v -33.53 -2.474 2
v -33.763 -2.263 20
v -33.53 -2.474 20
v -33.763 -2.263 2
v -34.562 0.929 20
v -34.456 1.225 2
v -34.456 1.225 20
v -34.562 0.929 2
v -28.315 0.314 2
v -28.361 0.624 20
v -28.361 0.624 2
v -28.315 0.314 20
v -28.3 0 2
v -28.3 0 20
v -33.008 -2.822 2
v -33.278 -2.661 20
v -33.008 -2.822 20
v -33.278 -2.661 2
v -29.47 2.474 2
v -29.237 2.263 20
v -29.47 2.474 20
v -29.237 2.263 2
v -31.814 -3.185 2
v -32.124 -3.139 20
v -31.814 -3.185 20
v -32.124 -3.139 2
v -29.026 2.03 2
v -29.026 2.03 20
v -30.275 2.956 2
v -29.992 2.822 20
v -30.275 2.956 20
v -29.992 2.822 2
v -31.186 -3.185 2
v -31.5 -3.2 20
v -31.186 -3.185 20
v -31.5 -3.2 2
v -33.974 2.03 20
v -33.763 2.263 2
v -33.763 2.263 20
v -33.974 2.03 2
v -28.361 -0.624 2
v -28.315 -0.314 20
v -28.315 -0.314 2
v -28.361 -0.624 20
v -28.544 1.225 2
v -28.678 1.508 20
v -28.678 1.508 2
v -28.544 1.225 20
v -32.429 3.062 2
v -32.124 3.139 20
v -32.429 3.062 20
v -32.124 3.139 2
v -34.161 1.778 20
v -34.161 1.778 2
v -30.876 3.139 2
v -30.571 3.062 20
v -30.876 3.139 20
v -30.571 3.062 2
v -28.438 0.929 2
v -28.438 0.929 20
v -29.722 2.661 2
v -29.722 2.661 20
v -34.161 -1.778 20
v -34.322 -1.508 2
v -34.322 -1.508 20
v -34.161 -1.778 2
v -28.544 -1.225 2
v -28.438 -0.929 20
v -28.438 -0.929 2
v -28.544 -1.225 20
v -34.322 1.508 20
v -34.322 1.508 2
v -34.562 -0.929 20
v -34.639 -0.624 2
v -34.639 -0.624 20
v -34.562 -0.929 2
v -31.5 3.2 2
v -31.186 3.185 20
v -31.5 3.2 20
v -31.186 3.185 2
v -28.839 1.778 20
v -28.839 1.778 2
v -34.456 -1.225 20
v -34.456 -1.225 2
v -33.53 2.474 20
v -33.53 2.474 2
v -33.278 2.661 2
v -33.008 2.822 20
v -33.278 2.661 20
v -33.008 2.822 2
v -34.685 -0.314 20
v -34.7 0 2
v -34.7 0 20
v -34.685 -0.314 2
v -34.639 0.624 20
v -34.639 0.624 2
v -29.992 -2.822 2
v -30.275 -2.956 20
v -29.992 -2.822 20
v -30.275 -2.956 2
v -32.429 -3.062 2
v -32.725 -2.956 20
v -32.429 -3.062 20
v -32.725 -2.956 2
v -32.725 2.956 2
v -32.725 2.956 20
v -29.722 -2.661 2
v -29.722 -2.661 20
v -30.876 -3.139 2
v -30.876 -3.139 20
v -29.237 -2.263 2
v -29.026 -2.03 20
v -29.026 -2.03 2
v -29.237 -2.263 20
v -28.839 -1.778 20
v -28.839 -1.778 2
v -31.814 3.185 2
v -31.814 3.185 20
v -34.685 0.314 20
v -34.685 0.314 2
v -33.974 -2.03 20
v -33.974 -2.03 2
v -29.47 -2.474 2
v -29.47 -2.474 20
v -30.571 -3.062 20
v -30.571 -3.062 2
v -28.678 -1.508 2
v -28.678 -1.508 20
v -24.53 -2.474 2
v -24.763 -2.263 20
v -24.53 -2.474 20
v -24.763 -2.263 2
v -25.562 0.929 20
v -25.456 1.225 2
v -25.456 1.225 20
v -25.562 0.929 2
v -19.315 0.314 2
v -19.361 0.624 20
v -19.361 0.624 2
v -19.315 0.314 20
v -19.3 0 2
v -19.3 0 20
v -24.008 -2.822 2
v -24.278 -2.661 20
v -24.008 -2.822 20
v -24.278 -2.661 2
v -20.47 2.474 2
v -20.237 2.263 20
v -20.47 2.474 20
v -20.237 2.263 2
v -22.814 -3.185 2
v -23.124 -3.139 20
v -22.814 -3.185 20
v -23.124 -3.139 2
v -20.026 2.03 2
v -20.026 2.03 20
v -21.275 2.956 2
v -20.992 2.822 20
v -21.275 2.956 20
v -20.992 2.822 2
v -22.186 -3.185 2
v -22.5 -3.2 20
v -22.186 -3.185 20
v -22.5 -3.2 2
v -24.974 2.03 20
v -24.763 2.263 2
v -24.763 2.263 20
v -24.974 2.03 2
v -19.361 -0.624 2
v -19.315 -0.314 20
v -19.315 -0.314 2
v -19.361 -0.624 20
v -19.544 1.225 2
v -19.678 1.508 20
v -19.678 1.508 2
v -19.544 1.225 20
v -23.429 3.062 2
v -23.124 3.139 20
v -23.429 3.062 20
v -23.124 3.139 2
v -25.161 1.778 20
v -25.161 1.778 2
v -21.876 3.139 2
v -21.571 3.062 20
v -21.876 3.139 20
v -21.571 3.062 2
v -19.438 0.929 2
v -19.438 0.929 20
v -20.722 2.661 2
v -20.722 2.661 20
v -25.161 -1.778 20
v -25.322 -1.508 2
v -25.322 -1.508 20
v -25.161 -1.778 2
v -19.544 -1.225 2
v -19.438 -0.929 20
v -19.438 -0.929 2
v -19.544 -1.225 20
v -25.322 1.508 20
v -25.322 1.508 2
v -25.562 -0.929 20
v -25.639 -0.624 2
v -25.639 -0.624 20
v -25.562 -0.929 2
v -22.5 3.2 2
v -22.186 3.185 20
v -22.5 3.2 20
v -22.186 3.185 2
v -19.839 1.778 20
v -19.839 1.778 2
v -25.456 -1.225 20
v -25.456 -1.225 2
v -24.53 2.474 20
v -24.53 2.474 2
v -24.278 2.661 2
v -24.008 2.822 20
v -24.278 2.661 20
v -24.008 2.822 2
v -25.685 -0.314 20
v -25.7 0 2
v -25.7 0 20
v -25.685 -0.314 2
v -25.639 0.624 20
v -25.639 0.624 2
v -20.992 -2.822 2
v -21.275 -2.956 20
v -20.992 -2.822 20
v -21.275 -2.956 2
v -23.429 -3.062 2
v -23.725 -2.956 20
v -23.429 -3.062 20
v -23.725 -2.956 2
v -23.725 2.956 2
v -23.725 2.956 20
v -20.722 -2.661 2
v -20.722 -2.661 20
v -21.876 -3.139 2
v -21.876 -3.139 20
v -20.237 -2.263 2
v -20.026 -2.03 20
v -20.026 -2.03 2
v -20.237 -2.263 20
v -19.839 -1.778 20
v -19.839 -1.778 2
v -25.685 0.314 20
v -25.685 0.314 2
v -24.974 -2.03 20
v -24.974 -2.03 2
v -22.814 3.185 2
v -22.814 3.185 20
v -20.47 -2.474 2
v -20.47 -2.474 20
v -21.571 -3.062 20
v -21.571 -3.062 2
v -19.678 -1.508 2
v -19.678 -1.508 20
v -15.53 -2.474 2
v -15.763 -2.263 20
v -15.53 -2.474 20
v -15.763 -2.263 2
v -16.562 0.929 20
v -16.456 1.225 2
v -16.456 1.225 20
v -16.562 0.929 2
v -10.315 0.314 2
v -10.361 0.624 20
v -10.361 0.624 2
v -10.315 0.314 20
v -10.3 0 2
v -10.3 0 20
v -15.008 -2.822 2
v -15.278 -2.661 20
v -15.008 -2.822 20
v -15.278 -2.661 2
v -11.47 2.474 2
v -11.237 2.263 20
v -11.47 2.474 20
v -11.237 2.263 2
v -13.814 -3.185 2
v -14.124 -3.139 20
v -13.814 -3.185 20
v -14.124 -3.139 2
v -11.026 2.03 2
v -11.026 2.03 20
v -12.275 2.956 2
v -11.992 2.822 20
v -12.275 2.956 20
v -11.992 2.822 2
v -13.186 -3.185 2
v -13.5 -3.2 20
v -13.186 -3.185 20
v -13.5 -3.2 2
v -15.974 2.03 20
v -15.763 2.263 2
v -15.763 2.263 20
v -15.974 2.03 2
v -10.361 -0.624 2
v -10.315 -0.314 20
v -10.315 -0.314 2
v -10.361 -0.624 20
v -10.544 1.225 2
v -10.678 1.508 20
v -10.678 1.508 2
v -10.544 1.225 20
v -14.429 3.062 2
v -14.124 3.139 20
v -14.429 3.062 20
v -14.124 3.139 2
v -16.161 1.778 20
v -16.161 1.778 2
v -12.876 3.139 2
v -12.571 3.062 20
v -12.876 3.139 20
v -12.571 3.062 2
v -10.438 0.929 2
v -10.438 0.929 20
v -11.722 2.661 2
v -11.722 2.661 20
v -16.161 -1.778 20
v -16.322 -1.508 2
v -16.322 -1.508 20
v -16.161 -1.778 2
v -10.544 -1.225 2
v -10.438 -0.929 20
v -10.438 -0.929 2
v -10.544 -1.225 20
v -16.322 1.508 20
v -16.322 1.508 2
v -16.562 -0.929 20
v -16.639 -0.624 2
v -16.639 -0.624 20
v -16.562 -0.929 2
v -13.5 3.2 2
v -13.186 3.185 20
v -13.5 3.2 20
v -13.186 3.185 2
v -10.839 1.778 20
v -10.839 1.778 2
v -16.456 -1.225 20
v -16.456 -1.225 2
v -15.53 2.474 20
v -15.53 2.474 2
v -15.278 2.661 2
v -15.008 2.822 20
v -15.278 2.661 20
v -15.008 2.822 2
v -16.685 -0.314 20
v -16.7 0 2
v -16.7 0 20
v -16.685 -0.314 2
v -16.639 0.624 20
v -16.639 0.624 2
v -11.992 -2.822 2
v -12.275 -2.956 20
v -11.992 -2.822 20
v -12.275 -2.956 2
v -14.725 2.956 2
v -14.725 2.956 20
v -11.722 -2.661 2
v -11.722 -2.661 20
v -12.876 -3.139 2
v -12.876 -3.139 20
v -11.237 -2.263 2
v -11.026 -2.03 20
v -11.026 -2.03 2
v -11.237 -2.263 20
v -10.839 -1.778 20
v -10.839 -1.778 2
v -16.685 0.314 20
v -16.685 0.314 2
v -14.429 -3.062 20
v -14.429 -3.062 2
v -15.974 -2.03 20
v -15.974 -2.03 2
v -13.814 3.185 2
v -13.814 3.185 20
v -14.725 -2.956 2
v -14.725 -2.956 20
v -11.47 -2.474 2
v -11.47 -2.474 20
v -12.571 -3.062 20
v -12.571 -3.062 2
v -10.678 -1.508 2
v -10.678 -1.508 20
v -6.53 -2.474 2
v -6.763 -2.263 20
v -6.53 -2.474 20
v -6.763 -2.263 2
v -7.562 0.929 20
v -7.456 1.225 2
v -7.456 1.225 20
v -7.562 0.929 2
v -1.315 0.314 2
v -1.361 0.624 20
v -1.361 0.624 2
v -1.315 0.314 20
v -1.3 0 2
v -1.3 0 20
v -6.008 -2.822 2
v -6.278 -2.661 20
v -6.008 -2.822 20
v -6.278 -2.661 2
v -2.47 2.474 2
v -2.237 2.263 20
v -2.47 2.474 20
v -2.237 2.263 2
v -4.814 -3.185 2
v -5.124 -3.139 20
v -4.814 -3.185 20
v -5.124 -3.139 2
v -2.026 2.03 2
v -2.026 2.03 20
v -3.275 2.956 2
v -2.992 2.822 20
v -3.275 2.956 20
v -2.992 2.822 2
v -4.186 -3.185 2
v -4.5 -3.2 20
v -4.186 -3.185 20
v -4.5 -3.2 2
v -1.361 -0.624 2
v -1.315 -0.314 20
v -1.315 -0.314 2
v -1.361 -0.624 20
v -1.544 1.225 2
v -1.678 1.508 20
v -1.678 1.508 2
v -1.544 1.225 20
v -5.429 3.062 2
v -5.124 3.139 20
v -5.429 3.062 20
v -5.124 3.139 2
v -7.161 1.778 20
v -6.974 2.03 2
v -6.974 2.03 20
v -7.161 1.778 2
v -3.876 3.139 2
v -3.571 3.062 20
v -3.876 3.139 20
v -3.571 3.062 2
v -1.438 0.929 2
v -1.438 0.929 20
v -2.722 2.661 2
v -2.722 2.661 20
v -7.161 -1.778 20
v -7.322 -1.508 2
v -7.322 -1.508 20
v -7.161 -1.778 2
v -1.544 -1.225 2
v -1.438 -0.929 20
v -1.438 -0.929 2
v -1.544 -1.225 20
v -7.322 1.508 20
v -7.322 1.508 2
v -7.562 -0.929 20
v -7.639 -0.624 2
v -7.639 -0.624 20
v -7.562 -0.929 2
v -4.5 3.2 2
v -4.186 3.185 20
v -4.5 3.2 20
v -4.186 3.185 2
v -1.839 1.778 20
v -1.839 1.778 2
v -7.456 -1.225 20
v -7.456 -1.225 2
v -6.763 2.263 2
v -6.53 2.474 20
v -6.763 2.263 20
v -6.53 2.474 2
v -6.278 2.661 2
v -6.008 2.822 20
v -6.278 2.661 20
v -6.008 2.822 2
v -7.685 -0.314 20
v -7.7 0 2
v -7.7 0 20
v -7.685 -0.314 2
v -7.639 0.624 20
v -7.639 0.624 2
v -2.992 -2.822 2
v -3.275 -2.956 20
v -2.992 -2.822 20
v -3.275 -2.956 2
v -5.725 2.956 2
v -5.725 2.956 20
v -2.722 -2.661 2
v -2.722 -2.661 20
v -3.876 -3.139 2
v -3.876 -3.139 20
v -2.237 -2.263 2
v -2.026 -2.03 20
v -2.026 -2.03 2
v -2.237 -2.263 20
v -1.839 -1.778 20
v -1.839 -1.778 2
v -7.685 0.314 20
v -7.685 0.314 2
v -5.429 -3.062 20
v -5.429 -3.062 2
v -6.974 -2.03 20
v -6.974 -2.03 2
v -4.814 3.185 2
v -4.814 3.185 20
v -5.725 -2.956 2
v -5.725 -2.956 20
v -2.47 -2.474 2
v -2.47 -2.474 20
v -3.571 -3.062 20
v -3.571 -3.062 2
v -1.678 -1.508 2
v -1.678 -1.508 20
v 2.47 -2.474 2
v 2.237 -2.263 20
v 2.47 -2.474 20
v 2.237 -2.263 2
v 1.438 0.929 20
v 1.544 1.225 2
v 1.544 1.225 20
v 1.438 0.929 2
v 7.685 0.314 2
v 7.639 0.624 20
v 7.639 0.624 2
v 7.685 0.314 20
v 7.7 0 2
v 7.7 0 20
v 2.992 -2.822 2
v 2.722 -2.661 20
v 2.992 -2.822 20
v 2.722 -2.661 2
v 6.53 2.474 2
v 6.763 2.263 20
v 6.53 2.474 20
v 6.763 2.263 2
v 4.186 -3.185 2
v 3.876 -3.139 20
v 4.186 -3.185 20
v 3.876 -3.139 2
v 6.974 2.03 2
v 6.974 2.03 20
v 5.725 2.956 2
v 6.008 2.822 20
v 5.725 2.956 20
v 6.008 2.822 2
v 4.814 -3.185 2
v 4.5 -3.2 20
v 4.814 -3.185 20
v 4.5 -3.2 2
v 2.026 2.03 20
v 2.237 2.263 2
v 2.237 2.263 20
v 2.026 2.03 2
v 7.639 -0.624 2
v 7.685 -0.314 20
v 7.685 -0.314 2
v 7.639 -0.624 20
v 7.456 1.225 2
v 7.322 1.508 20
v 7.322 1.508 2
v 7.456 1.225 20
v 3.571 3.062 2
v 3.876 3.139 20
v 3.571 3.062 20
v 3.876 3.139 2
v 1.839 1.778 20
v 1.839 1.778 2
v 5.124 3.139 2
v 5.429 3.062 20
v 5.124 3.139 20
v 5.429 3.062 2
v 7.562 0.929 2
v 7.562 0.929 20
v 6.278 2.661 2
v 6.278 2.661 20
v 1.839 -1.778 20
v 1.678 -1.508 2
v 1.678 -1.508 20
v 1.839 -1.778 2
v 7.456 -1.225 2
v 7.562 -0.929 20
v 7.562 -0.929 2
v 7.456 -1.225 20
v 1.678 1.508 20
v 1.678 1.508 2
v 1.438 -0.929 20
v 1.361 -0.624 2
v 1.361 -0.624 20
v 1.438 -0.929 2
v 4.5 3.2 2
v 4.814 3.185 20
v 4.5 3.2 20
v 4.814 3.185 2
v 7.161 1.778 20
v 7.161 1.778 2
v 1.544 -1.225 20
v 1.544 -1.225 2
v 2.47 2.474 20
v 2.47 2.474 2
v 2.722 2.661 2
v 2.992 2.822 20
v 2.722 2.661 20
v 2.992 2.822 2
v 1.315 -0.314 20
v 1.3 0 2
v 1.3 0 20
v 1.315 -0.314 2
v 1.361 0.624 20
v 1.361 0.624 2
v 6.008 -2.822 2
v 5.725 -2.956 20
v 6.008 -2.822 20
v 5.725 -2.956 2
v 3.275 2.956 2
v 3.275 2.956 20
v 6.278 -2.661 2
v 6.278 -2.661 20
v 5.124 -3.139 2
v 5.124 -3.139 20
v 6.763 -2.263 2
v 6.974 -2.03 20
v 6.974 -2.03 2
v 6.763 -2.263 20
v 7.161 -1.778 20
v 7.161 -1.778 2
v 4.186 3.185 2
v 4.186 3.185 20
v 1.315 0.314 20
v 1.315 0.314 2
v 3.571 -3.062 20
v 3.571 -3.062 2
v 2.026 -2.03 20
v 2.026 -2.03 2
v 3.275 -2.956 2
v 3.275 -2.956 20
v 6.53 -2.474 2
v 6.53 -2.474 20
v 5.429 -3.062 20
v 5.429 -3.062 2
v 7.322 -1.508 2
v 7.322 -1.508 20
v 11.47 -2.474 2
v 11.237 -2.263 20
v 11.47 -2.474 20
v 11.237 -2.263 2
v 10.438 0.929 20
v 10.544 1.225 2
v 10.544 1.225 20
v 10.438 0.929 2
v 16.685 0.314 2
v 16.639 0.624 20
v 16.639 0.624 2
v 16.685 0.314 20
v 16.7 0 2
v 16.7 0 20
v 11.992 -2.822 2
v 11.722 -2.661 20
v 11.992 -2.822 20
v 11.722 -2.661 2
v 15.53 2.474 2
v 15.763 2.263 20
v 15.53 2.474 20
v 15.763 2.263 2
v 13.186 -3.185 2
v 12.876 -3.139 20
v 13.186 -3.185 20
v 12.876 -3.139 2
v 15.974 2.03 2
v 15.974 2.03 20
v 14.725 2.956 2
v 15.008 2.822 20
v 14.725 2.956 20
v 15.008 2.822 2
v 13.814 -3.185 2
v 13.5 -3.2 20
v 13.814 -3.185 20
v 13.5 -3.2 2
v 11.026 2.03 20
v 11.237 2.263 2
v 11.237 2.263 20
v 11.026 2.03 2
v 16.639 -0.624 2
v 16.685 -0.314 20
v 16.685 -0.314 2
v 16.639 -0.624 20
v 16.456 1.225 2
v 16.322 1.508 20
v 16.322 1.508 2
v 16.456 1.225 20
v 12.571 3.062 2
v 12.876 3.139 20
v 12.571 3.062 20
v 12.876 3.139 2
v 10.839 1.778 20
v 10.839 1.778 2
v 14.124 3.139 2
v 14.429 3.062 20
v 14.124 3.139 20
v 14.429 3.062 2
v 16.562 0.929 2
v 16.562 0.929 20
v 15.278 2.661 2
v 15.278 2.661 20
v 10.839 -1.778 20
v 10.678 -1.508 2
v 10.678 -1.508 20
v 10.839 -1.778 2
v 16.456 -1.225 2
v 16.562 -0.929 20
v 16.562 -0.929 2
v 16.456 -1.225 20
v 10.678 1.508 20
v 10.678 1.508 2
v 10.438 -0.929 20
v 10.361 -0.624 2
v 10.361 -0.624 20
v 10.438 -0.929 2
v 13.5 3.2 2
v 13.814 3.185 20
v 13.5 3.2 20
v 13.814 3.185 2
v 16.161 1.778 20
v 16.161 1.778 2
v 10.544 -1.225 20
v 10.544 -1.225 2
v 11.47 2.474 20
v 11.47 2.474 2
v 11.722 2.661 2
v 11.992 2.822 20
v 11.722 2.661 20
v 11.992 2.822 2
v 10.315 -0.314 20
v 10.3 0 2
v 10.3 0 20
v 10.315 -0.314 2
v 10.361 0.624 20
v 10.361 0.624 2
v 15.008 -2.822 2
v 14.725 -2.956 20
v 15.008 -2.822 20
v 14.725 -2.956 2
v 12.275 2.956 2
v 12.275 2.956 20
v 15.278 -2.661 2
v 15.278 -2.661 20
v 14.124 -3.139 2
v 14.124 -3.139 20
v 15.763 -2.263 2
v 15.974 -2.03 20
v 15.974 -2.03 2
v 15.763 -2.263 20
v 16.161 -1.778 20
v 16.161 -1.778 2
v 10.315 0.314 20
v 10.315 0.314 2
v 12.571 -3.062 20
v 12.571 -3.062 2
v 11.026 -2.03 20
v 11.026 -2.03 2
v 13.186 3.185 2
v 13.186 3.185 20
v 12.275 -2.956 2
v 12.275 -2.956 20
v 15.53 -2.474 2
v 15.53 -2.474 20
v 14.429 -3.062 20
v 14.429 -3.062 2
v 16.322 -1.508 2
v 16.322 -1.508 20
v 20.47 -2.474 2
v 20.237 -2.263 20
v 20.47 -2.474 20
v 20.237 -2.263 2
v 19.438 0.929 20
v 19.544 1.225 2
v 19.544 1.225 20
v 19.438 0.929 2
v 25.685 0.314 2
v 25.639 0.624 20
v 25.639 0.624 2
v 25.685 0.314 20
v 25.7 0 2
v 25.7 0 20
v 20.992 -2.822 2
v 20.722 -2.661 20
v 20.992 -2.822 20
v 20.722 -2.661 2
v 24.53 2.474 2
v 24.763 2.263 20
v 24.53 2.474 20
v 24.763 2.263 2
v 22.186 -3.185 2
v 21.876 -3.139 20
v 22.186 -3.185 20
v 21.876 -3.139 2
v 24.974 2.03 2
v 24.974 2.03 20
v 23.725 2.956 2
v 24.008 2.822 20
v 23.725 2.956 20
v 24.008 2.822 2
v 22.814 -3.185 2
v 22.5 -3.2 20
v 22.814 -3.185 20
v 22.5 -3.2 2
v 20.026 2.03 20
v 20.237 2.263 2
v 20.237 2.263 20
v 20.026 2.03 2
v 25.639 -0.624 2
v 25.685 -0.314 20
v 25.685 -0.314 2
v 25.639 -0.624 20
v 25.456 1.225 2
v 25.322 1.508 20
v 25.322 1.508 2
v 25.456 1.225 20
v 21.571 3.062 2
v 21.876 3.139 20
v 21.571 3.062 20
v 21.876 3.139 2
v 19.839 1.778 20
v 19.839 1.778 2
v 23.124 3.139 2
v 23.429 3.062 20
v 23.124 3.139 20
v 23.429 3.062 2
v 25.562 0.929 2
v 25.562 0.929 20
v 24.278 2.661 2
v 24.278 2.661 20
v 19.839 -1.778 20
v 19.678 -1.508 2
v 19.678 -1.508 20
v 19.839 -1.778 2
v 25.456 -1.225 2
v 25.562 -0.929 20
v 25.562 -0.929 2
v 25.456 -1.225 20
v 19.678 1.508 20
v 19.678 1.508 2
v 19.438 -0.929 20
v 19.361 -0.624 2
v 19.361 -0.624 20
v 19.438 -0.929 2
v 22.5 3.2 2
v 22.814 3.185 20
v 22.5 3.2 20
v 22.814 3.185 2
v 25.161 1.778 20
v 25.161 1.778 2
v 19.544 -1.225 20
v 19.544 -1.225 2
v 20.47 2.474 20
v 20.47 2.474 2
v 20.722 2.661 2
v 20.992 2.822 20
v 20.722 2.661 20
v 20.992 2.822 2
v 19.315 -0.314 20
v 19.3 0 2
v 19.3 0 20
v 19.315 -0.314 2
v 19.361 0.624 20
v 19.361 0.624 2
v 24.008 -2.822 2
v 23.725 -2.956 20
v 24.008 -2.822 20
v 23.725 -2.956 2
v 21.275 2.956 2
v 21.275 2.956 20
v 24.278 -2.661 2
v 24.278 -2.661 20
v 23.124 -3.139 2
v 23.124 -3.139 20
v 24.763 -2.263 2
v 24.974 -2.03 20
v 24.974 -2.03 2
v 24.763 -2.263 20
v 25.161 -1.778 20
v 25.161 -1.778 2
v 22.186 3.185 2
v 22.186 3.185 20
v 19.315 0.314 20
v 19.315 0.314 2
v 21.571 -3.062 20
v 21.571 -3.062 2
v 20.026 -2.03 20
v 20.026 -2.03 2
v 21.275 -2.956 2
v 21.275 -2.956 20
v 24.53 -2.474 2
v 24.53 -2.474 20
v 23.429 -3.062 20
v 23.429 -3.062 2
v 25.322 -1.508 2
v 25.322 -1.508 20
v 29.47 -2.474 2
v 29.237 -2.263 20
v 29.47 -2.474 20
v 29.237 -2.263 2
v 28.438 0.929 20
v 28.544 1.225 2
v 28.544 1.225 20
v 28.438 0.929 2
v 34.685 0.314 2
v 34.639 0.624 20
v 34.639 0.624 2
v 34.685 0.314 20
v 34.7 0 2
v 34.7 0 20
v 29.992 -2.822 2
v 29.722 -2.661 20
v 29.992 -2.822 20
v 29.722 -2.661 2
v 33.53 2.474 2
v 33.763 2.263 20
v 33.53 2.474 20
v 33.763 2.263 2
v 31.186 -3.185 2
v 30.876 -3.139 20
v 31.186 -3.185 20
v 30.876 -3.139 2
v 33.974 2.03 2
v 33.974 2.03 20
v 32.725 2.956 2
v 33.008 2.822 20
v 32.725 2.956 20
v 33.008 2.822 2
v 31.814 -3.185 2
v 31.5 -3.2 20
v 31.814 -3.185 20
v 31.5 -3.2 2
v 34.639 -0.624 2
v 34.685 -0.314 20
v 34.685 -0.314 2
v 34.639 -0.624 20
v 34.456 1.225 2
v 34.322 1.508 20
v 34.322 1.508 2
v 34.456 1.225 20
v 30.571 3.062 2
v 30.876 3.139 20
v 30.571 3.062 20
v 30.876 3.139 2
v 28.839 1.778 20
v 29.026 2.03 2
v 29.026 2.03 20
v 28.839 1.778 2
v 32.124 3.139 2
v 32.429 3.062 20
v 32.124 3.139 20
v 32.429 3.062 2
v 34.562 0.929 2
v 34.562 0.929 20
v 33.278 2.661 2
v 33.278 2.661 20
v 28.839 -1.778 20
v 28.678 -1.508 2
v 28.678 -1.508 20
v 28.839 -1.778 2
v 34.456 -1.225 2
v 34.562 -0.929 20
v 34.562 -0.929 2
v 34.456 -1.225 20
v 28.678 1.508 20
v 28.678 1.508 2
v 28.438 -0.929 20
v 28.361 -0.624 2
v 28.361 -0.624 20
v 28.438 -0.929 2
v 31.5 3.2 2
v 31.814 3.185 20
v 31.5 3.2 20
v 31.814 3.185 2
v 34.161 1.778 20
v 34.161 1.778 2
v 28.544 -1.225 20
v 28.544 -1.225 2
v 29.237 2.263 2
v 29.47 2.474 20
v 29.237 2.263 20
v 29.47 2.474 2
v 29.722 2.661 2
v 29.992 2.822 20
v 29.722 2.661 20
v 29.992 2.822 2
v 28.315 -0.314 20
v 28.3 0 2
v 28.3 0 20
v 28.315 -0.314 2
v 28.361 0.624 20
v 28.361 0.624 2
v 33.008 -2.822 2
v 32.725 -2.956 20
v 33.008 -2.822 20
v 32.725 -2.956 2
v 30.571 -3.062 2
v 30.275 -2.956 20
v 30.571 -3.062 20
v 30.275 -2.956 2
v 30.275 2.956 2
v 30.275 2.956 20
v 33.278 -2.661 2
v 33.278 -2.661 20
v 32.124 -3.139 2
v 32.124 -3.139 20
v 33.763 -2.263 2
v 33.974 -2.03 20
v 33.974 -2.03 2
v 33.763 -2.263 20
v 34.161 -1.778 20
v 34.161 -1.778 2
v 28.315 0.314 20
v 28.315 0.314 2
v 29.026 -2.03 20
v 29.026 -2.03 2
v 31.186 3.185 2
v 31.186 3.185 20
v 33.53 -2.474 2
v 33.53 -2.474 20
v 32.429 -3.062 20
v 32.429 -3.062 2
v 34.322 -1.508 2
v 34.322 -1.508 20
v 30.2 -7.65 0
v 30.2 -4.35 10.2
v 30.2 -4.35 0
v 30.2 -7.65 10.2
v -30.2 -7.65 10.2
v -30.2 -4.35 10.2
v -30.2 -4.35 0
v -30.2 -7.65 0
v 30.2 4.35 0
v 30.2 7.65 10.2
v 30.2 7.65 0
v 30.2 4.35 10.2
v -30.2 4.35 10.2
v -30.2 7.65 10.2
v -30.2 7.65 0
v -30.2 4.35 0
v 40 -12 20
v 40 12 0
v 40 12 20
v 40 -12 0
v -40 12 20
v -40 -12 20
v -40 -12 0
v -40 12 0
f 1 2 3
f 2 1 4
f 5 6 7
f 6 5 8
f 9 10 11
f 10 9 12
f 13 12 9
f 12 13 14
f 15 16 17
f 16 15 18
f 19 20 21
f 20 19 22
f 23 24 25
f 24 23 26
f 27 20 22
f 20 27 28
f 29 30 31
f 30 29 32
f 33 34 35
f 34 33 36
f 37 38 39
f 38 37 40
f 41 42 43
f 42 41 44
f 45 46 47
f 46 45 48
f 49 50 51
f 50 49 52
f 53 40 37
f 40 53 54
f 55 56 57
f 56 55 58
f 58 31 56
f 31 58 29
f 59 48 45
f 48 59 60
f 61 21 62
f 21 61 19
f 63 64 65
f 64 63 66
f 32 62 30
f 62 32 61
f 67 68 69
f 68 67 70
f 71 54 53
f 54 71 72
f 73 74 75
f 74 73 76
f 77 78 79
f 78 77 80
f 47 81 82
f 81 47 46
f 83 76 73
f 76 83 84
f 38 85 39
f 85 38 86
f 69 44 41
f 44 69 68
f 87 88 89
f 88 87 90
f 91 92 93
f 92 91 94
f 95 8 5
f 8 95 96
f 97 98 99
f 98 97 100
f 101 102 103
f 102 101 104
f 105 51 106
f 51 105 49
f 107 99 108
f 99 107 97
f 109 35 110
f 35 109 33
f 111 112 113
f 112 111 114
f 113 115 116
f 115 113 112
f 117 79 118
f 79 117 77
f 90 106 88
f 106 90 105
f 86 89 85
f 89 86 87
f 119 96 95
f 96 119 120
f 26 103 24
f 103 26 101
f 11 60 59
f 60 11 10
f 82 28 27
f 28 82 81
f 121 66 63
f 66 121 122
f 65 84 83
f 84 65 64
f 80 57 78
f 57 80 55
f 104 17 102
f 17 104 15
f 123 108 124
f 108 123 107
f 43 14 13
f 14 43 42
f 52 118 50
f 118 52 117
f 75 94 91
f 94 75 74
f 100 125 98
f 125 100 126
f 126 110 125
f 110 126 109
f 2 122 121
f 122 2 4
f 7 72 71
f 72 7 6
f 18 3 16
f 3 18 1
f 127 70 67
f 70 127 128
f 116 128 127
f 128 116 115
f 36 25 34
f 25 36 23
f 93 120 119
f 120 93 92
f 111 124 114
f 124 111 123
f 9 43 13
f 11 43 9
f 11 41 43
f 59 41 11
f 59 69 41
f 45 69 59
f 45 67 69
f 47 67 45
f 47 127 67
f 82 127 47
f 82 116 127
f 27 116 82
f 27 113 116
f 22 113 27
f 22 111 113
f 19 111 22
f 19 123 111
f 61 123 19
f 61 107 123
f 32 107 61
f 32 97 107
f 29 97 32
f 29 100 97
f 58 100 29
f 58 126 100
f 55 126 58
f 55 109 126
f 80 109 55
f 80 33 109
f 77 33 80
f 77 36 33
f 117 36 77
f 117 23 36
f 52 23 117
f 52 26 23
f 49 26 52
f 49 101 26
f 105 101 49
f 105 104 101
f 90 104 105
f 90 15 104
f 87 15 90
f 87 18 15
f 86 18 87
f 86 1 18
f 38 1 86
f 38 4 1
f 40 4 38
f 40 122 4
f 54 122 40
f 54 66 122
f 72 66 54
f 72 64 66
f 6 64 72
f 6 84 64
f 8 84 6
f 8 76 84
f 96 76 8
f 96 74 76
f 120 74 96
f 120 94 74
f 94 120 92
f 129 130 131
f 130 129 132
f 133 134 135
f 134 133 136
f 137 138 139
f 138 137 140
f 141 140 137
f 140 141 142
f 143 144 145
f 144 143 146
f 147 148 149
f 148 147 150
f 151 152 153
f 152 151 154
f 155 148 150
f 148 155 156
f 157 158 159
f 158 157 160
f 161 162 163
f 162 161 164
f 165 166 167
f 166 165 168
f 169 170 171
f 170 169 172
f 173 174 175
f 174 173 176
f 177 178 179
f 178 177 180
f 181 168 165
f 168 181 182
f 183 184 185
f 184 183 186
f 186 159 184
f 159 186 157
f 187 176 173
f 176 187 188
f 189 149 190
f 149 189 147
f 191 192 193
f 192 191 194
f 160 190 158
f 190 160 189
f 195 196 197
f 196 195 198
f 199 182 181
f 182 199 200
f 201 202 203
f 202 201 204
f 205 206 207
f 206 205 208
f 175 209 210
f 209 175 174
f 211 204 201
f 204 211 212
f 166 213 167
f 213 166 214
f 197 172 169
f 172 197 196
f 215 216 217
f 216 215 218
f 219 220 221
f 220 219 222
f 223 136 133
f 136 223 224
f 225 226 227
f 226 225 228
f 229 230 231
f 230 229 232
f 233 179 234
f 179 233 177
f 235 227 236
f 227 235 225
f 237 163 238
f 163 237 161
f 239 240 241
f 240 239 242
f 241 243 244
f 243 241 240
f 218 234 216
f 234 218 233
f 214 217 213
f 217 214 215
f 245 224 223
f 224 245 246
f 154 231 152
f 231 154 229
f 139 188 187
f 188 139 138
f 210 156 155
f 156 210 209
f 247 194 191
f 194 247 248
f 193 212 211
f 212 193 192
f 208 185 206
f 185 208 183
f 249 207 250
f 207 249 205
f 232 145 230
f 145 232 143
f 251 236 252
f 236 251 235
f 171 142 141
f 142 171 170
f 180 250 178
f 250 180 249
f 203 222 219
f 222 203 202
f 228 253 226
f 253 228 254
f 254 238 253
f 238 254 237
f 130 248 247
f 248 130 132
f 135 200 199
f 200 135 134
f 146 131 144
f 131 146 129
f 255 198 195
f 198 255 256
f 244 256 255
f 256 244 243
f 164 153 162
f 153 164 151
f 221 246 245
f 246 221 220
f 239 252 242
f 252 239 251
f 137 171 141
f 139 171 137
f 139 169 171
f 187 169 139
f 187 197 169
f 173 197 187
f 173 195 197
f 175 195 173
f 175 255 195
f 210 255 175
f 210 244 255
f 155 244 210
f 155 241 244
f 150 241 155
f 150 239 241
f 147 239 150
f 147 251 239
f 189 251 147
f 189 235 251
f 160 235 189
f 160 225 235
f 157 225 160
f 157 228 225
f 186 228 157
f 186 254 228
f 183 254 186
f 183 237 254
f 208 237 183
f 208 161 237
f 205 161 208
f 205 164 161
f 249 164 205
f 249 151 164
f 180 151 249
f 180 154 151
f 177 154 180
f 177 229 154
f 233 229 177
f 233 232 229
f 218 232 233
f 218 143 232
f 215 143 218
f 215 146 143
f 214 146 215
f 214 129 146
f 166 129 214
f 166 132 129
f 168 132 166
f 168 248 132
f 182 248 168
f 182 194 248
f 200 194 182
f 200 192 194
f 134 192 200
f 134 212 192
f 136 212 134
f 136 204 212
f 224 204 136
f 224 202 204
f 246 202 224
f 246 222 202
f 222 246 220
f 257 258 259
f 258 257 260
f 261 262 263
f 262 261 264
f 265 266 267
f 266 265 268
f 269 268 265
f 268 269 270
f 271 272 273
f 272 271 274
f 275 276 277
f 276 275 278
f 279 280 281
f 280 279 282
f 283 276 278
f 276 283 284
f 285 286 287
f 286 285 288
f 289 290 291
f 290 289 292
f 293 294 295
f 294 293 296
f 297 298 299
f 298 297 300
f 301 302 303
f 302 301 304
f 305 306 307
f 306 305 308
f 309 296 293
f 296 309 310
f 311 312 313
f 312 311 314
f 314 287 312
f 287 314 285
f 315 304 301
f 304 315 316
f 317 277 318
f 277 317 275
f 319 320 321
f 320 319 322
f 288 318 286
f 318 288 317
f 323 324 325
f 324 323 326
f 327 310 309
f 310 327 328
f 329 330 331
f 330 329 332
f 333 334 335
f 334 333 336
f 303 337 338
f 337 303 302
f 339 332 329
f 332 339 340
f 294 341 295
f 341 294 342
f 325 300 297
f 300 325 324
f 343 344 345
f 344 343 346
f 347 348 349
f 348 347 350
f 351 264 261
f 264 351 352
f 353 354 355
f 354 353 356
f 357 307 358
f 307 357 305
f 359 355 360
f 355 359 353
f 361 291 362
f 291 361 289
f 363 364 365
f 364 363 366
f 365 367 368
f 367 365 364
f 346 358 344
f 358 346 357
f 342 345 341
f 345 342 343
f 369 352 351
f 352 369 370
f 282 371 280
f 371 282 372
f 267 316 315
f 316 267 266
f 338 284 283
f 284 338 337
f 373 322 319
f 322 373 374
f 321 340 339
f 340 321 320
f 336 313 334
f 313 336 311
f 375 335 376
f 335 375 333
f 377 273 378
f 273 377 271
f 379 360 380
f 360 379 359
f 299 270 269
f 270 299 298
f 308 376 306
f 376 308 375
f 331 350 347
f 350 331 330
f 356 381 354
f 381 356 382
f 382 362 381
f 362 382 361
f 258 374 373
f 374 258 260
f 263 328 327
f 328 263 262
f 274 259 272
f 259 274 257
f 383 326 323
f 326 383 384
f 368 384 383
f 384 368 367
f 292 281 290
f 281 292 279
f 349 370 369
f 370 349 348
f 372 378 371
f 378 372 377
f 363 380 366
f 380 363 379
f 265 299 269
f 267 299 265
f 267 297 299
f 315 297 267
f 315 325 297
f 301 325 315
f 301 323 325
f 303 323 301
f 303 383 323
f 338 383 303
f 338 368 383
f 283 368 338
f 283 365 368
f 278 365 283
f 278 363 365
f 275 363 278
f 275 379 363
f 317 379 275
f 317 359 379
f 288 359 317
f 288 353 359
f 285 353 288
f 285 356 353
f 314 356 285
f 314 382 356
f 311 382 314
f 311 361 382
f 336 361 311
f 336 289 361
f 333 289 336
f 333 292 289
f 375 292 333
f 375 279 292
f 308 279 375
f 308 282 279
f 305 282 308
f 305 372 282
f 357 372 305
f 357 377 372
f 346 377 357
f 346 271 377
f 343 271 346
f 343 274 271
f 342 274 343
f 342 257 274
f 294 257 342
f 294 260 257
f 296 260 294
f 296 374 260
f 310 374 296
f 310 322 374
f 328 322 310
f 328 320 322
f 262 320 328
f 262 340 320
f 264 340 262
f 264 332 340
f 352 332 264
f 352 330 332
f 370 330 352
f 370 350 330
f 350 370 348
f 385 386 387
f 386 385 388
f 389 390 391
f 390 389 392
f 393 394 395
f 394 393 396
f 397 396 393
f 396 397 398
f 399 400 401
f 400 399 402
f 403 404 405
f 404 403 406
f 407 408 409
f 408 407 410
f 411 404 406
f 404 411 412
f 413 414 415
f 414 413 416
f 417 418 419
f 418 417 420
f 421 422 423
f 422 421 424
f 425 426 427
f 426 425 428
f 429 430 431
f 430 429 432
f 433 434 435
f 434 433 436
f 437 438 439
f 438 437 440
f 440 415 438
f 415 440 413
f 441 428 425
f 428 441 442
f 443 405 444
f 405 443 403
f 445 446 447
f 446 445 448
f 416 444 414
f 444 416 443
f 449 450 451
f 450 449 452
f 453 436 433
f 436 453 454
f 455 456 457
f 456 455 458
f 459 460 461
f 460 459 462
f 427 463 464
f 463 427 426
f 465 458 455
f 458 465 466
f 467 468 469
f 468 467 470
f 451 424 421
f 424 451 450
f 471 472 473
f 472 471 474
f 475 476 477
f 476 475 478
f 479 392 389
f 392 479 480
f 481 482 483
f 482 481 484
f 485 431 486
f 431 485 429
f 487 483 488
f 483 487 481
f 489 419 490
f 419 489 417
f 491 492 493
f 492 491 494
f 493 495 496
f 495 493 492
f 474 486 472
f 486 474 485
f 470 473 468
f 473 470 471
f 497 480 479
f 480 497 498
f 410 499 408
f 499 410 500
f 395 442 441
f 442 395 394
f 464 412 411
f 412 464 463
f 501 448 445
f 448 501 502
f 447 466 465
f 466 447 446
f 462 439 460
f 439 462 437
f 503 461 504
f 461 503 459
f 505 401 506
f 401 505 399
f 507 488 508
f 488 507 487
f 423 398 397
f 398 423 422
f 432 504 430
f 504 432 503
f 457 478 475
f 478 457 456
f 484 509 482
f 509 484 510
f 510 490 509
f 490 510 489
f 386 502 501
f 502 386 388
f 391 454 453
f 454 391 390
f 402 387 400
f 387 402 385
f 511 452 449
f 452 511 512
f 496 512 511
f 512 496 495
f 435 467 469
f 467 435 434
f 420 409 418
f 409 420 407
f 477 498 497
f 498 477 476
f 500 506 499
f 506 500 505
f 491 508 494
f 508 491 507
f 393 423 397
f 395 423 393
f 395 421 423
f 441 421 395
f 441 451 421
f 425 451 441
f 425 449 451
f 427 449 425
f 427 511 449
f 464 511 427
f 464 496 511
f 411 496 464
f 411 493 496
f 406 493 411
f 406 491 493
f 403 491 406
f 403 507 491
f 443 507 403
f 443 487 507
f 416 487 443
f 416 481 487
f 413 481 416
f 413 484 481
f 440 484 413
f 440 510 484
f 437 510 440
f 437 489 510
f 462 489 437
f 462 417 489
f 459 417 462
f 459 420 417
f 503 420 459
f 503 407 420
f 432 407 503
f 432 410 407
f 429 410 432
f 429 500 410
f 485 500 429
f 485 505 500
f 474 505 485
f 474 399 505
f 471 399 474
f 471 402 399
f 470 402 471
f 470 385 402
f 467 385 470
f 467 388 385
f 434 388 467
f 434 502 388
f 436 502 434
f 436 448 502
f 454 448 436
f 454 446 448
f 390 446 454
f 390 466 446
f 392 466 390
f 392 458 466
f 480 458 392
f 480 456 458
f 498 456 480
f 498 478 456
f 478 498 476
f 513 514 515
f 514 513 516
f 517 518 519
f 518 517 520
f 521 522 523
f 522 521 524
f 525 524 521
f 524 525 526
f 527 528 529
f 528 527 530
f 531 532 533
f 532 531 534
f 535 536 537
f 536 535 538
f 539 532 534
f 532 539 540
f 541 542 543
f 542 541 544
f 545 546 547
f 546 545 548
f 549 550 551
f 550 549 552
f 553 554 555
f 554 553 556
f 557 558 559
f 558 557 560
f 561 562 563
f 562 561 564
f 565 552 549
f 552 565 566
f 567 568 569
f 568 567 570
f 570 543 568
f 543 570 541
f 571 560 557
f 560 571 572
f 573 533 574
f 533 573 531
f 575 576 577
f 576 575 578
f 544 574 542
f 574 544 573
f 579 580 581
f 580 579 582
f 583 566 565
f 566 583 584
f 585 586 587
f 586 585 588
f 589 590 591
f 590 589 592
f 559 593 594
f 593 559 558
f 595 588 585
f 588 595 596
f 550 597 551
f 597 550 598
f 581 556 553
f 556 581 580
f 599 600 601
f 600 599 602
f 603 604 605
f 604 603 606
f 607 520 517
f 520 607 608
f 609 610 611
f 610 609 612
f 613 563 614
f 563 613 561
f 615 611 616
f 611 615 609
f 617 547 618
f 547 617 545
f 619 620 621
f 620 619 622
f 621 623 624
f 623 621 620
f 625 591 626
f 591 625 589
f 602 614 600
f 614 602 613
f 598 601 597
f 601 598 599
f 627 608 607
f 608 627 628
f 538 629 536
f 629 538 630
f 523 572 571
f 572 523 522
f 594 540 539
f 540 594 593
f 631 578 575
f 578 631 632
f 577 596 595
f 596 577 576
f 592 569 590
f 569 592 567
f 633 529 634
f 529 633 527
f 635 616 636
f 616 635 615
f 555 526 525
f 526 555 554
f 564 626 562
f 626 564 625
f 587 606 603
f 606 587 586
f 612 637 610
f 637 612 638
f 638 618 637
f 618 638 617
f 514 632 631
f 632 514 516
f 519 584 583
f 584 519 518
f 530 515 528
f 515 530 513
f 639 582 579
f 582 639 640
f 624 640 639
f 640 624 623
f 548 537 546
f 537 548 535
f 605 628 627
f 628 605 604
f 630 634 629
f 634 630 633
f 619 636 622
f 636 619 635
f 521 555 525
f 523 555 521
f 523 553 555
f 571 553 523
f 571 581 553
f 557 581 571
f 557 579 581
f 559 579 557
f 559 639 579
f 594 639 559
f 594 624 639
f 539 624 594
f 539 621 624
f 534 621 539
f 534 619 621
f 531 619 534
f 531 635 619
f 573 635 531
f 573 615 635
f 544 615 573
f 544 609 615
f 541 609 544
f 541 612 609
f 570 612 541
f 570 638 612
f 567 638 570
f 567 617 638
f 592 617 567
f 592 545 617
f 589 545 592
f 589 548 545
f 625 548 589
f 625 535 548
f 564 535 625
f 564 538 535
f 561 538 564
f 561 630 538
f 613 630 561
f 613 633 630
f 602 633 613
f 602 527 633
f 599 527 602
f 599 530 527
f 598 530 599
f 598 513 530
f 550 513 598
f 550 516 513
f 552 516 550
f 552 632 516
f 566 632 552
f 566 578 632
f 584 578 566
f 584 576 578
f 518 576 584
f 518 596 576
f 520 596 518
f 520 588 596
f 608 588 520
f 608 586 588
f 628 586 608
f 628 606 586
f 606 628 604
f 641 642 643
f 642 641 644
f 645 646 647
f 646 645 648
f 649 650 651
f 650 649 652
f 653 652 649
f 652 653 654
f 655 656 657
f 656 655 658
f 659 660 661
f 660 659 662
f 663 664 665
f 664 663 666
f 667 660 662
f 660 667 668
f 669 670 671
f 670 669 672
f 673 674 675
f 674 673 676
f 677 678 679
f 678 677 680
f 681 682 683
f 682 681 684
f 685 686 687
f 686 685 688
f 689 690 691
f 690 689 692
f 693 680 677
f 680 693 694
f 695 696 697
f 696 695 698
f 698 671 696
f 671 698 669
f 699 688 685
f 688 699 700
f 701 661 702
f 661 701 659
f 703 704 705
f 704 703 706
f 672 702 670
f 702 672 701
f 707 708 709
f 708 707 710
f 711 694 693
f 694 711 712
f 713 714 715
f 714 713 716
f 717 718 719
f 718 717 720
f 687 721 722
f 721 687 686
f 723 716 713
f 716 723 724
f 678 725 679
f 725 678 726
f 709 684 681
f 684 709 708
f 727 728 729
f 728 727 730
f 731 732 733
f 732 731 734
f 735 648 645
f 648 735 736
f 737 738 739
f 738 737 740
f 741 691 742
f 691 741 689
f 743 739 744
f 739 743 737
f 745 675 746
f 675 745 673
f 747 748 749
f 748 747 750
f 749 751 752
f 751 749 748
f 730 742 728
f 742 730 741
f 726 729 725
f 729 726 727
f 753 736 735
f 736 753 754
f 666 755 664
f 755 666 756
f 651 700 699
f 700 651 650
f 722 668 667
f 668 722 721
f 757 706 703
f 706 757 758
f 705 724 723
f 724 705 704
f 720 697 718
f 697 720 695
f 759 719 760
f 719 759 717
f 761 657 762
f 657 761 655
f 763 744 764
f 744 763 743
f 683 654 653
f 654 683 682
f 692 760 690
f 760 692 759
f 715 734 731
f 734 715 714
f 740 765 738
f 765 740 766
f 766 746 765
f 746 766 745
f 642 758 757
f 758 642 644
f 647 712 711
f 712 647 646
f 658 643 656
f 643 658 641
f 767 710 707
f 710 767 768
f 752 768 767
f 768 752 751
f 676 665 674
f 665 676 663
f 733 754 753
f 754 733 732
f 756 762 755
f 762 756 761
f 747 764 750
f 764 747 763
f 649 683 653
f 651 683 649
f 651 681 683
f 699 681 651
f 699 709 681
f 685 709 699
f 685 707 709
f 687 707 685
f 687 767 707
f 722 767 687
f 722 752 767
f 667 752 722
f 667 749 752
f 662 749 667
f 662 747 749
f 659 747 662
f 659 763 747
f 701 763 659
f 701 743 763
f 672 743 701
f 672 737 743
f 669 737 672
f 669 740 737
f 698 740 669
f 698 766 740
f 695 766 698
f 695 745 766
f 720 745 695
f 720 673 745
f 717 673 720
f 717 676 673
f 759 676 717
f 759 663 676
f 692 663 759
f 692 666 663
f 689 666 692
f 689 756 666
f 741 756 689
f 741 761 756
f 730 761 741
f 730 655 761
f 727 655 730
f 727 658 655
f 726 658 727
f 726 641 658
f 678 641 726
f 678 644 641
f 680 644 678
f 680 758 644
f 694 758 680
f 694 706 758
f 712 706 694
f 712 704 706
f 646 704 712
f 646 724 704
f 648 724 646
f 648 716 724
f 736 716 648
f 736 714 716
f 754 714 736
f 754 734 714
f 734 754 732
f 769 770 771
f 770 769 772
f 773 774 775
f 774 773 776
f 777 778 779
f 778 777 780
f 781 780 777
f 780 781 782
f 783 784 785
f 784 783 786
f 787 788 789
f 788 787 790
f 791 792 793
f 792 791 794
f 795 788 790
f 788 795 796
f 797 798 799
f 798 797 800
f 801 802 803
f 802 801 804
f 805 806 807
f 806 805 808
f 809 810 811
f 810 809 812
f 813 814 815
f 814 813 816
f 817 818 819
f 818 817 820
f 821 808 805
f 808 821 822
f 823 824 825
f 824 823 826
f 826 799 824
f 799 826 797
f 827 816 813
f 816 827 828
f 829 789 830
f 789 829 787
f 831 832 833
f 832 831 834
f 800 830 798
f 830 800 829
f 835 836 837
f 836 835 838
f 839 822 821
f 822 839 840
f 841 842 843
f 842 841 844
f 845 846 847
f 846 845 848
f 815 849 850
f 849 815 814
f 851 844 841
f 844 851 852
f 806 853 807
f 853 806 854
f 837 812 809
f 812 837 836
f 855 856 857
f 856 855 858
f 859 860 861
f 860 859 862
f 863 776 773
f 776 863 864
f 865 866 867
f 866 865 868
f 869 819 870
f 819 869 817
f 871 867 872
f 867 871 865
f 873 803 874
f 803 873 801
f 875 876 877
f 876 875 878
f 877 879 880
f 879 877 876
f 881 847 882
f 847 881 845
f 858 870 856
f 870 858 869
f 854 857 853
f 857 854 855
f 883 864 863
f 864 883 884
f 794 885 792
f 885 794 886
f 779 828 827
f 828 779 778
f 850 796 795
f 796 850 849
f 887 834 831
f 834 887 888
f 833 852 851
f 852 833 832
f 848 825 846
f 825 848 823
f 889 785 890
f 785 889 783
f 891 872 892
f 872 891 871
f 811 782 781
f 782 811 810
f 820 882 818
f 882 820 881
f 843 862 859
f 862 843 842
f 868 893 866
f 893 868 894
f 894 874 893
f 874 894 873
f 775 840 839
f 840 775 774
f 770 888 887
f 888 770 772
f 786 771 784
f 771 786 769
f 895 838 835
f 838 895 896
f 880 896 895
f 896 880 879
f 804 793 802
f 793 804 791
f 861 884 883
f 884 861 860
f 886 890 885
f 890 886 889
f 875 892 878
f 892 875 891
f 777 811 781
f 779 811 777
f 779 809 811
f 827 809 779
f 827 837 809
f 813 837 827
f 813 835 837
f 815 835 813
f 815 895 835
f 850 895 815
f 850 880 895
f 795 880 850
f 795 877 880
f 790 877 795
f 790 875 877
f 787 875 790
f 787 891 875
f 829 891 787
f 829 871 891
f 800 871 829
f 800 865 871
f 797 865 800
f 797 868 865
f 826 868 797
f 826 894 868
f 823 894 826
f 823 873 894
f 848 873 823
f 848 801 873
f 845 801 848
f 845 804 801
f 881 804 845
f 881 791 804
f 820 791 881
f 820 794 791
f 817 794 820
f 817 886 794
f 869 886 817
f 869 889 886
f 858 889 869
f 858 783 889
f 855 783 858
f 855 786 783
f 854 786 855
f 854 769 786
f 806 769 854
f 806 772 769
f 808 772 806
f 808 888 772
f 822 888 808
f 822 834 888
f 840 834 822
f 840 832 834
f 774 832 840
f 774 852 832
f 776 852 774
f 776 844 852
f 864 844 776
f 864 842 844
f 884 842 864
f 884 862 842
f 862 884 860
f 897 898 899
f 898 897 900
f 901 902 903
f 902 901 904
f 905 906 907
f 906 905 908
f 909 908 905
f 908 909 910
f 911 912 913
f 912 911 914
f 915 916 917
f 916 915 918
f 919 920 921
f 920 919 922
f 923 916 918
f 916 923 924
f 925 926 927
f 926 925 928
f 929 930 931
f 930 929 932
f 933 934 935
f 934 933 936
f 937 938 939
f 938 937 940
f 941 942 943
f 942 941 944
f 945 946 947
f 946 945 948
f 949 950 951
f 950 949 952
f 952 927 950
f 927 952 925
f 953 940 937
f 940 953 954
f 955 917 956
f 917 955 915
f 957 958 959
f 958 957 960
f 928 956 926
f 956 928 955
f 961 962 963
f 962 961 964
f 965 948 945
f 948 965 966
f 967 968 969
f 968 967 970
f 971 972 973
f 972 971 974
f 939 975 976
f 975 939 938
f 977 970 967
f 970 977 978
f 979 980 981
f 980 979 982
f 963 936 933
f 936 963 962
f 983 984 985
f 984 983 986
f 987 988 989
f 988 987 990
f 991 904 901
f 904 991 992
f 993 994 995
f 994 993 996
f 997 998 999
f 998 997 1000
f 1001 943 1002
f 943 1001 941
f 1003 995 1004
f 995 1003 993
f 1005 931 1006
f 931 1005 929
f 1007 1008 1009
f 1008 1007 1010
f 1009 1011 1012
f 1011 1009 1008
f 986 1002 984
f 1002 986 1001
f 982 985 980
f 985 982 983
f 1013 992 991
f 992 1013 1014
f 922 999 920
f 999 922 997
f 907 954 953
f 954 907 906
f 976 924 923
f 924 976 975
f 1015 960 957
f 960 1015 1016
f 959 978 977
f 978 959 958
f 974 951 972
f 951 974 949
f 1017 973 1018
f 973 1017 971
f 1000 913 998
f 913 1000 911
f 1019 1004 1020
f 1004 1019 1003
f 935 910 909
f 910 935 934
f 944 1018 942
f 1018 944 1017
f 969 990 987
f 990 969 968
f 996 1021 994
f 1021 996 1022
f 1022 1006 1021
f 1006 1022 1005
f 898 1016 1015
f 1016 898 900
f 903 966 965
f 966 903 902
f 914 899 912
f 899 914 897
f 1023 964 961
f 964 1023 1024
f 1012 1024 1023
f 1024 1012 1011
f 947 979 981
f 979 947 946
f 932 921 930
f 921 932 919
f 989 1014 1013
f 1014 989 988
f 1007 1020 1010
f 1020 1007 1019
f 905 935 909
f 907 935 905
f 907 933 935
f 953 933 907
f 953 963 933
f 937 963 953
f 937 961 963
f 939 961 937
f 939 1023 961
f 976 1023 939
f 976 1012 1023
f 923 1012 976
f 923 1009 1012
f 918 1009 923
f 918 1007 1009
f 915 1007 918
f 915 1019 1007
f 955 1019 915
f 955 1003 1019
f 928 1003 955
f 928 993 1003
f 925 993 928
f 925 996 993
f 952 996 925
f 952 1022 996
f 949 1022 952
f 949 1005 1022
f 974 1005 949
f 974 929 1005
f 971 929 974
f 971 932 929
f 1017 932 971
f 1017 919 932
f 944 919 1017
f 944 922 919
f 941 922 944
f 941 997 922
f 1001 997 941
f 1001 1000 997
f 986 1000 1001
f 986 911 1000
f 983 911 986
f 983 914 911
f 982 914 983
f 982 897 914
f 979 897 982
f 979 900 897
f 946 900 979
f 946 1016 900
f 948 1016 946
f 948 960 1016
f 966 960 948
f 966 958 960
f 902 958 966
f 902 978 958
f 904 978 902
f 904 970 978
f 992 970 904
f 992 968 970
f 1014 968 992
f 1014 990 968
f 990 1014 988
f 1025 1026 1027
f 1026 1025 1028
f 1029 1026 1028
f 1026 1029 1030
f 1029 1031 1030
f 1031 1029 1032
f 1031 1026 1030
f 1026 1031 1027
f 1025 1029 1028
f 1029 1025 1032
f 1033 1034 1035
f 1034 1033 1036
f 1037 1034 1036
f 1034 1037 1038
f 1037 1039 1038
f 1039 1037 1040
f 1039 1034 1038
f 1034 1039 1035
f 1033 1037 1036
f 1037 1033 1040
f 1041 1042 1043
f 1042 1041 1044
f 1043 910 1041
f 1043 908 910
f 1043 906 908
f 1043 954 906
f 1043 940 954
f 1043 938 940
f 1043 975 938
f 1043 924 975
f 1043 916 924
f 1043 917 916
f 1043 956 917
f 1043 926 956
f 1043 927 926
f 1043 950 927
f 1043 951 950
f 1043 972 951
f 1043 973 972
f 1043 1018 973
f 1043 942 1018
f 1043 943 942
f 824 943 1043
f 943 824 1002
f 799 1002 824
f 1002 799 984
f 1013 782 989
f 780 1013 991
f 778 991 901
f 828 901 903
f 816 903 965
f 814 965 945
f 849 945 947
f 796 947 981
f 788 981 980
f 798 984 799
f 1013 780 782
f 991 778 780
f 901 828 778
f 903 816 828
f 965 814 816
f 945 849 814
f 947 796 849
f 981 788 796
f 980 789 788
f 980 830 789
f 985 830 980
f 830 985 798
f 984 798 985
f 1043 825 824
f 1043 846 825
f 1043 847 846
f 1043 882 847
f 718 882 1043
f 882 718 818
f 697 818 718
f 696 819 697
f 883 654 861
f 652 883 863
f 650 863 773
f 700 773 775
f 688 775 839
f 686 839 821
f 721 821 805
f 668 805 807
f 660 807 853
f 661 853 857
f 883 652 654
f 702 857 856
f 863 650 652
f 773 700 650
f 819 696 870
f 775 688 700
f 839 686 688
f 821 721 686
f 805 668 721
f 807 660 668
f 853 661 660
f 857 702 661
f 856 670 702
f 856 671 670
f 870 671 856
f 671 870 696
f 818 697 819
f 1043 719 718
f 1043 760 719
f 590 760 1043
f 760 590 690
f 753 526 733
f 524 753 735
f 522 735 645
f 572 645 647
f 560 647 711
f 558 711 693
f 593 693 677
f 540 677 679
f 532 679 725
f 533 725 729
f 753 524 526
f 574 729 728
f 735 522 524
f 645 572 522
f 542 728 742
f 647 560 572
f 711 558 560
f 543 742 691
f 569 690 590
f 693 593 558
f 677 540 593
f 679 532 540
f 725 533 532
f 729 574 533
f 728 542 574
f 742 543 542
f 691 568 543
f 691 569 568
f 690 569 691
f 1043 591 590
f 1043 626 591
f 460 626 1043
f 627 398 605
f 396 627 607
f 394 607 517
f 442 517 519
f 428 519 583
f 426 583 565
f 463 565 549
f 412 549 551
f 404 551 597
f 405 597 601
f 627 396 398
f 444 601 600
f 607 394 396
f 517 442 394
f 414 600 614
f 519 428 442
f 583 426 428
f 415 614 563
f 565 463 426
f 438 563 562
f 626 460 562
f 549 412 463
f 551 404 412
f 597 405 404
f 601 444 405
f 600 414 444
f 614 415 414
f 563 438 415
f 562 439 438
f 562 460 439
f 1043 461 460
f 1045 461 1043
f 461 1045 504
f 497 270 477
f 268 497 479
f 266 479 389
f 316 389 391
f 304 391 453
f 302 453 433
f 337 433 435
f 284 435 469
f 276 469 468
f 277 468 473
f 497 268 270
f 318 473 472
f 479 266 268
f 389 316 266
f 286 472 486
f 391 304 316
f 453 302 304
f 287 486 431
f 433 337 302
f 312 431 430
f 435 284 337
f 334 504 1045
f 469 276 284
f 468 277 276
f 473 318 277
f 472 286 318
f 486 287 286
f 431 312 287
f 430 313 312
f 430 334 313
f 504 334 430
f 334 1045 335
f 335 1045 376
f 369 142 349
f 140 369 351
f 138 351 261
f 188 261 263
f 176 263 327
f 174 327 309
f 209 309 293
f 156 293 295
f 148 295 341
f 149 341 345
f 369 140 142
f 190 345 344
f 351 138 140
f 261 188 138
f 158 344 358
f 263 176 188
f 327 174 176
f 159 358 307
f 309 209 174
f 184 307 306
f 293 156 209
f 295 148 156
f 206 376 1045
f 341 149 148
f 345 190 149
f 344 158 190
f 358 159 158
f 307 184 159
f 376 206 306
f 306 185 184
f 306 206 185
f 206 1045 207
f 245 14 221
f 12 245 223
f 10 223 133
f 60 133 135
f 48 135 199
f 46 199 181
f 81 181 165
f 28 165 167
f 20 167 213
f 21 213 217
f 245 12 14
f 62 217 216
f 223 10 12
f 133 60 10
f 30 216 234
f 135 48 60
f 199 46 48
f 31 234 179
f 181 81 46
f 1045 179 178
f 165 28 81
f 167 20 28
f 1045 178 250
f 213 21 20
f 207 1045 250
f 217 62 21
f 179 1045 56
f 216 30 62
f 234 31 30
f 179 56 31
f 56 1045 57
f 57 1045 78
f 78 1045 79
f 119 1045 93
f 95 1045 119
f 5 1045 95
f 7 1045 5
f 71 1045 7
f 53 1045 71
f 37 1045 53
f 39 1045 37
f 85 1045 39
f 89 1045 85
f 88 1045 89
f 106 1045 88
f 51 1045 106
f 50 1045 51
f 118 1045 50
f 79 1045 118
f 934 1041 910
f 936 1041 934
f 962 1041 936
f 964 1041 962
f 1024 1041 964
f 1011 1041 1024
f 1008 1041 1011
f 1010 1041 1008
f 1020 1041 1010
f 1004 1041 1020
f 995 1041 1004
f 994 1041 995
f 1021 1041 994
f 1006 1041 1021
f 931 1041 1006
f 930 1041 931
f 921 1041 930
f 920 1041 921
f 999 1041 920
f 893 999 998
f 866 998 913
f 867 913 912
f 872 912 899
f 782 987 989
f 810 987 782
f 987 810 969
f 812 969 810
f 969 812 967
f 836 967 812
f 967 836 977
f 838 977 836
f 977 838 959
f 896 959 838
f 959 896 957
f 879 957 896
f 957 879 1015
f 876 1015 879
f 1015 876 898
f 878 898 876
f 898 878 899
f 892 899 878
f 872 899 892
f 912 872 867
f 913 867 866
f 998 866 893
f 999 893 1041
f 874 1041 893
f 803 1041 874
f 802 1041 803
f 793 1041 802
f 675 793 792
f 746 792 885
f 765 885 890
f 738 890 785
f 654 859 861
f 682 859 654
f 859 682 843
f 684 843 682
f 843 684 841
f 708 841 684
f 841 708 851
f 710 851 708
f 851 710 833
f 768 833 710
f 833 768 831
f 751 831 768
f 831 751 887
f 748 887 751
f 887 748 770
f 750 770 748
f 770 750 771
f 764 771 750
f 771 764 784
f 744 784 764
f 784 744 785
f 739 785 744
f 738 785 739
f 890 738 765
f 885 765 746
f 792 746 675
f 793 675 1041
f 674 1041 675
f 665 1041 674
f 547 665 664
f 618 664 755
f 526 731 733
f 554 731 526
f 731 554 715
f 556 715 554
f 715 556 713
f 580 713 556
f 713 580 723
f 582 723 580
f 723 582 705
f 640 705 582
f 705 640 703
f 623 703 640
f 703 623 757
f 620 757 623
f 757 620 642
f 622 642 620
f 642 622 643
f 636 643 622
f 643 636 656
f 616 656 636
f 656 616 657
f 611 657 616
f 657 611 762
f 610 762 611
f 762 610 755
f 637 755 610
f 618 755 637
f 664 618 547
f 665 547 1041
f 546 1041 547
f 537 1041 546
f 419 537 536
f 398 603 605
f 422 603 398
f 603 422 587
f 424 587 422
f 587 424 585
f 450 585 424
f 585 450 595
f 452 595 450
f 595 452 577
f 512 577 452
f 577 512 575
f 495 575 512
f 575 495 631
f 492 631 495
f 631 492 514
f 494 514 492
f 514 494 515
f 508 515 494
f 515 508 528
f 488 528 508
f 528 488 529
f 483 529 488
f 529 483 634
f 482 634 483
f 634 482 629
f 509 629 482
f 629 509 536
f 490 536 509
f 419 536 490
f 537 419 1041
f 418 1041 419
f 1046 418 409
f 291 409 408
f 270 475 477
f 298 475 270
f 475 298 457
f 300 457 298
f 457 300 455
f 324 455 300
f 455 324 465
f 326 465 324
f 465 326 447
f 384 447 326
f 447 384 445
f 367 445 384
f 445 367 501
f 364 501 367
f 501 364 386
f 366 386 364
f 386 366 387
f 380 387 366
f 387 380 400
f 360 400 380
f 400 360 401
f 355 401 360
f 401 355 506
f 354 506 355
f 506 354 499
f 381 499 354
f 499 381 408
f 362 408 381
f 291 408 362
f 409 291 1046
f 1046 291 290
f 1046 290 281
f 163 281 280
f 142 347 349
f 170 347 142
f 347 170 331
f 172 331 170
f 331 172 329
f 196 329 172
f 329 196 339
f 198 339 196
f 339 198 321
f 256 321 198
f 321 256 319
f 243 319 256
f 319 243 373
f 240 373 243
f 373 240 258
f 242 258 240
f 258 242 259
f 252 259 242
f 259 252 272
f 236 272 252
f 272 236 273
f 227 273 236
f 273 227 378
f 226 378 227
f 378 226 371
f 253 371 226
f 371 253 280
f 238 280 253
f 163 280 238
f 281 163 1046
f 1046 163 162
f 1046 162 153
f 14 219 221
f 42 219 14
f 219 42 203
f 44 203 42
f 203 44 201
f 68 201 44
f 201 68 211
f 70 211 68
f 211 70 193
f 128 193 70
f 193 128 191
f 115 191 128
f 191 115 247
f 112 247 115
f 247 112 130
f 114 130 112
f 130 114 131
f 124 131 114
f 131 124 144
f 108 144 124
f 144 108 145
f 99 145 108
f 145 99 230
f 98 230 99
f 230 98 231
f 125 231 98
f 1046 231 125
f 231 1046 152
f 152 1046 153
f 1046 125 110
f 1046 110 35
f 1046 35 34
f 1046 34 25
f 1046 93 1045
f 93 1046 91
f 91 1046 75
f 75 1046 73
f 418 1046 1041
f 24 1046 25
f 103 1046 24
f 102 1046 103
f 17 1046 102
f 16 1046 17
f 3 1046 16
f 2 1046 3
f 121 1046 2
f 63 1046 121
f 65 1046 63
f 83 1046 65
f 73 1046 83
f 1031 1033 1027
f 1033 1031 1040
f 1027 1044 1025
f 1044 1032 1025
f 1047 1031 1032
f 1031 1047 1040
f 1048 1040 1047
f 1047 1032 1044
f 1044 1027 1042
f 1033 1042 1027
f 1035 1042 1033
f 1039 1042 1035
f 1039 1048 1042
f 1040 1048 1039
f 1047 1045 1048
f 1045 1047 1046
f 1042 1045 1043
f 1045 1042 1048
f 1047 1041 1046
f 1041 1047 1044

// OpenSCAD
// KNOWN-WRONG PART (must fail): the seats are 6.4 mm all the way down to z = 2 (no cone)
// Magnetic bead separation rack for one 8-tube strip of 0.2 mL PCR tubes
// Category: tools. A block with a row of tube seats (cylinder + cone, closed below) and two
// pockets, open at the bottom face, for 60 x 10 x 3 mm N52 bar magnets beside the tubes.
// Print: PLA or PETG, standing on its bottom face, 0.2 mm layers; press the magnets in from
// below and secure each with a drop of glue.
// SPDX-License-Identifier: CERN-OHL-P-2.0

/* [Rack] */
block = [80, 24, 20];     // X, Y, Z [mm]
n_tubes = 8;
pitch = 9;                // PCR strip pitch [mm]
seat_d = 6.4;             // cylindrical part of the seat
seat_cyl_z = 12;          // the cylinder runs from here to the top face
tip_d = 6.4;              // the cone narrows to this diameter ...
tip_z = 2;                // ... at this height, where the seat ends (2 mm floor)
pocket = [60.4, 3.3, 10.2]; // magnet pocket X, Y, Z (60 x 3 x 10 mm magnet + clearance)
pocket_y = 6;             // pocket centre planes at y = -6 and y = +6

/* [Hidden] */
$fn = 64;
eps = 0.01;

difference() {
    translate([-block.x / 2, -block.y / 2, 0]) cube(block);
    for (i = [0 : n_tubes - 1])
        translate([(i - (n_tubes - 1) / 2) * pitch, 0, 0]) {
            translate([0, 0, seat_cyl_z]) cylinder(d = seat_d, h = block.z - seat_cyl_z + eps);
            translate([0, 0, tip_z]) cylinder(d1 = tip_d, d2 = seat_d, h = seat_cyl_z - tip_z + eps);
        }
    for (s = [-1, 1])
        translate([-pocket.x / 2, s * pocket_y - pocket.y / 2, -eps])
            cube([pocket.x, pocket.y, pocket.z + eps]);
}
